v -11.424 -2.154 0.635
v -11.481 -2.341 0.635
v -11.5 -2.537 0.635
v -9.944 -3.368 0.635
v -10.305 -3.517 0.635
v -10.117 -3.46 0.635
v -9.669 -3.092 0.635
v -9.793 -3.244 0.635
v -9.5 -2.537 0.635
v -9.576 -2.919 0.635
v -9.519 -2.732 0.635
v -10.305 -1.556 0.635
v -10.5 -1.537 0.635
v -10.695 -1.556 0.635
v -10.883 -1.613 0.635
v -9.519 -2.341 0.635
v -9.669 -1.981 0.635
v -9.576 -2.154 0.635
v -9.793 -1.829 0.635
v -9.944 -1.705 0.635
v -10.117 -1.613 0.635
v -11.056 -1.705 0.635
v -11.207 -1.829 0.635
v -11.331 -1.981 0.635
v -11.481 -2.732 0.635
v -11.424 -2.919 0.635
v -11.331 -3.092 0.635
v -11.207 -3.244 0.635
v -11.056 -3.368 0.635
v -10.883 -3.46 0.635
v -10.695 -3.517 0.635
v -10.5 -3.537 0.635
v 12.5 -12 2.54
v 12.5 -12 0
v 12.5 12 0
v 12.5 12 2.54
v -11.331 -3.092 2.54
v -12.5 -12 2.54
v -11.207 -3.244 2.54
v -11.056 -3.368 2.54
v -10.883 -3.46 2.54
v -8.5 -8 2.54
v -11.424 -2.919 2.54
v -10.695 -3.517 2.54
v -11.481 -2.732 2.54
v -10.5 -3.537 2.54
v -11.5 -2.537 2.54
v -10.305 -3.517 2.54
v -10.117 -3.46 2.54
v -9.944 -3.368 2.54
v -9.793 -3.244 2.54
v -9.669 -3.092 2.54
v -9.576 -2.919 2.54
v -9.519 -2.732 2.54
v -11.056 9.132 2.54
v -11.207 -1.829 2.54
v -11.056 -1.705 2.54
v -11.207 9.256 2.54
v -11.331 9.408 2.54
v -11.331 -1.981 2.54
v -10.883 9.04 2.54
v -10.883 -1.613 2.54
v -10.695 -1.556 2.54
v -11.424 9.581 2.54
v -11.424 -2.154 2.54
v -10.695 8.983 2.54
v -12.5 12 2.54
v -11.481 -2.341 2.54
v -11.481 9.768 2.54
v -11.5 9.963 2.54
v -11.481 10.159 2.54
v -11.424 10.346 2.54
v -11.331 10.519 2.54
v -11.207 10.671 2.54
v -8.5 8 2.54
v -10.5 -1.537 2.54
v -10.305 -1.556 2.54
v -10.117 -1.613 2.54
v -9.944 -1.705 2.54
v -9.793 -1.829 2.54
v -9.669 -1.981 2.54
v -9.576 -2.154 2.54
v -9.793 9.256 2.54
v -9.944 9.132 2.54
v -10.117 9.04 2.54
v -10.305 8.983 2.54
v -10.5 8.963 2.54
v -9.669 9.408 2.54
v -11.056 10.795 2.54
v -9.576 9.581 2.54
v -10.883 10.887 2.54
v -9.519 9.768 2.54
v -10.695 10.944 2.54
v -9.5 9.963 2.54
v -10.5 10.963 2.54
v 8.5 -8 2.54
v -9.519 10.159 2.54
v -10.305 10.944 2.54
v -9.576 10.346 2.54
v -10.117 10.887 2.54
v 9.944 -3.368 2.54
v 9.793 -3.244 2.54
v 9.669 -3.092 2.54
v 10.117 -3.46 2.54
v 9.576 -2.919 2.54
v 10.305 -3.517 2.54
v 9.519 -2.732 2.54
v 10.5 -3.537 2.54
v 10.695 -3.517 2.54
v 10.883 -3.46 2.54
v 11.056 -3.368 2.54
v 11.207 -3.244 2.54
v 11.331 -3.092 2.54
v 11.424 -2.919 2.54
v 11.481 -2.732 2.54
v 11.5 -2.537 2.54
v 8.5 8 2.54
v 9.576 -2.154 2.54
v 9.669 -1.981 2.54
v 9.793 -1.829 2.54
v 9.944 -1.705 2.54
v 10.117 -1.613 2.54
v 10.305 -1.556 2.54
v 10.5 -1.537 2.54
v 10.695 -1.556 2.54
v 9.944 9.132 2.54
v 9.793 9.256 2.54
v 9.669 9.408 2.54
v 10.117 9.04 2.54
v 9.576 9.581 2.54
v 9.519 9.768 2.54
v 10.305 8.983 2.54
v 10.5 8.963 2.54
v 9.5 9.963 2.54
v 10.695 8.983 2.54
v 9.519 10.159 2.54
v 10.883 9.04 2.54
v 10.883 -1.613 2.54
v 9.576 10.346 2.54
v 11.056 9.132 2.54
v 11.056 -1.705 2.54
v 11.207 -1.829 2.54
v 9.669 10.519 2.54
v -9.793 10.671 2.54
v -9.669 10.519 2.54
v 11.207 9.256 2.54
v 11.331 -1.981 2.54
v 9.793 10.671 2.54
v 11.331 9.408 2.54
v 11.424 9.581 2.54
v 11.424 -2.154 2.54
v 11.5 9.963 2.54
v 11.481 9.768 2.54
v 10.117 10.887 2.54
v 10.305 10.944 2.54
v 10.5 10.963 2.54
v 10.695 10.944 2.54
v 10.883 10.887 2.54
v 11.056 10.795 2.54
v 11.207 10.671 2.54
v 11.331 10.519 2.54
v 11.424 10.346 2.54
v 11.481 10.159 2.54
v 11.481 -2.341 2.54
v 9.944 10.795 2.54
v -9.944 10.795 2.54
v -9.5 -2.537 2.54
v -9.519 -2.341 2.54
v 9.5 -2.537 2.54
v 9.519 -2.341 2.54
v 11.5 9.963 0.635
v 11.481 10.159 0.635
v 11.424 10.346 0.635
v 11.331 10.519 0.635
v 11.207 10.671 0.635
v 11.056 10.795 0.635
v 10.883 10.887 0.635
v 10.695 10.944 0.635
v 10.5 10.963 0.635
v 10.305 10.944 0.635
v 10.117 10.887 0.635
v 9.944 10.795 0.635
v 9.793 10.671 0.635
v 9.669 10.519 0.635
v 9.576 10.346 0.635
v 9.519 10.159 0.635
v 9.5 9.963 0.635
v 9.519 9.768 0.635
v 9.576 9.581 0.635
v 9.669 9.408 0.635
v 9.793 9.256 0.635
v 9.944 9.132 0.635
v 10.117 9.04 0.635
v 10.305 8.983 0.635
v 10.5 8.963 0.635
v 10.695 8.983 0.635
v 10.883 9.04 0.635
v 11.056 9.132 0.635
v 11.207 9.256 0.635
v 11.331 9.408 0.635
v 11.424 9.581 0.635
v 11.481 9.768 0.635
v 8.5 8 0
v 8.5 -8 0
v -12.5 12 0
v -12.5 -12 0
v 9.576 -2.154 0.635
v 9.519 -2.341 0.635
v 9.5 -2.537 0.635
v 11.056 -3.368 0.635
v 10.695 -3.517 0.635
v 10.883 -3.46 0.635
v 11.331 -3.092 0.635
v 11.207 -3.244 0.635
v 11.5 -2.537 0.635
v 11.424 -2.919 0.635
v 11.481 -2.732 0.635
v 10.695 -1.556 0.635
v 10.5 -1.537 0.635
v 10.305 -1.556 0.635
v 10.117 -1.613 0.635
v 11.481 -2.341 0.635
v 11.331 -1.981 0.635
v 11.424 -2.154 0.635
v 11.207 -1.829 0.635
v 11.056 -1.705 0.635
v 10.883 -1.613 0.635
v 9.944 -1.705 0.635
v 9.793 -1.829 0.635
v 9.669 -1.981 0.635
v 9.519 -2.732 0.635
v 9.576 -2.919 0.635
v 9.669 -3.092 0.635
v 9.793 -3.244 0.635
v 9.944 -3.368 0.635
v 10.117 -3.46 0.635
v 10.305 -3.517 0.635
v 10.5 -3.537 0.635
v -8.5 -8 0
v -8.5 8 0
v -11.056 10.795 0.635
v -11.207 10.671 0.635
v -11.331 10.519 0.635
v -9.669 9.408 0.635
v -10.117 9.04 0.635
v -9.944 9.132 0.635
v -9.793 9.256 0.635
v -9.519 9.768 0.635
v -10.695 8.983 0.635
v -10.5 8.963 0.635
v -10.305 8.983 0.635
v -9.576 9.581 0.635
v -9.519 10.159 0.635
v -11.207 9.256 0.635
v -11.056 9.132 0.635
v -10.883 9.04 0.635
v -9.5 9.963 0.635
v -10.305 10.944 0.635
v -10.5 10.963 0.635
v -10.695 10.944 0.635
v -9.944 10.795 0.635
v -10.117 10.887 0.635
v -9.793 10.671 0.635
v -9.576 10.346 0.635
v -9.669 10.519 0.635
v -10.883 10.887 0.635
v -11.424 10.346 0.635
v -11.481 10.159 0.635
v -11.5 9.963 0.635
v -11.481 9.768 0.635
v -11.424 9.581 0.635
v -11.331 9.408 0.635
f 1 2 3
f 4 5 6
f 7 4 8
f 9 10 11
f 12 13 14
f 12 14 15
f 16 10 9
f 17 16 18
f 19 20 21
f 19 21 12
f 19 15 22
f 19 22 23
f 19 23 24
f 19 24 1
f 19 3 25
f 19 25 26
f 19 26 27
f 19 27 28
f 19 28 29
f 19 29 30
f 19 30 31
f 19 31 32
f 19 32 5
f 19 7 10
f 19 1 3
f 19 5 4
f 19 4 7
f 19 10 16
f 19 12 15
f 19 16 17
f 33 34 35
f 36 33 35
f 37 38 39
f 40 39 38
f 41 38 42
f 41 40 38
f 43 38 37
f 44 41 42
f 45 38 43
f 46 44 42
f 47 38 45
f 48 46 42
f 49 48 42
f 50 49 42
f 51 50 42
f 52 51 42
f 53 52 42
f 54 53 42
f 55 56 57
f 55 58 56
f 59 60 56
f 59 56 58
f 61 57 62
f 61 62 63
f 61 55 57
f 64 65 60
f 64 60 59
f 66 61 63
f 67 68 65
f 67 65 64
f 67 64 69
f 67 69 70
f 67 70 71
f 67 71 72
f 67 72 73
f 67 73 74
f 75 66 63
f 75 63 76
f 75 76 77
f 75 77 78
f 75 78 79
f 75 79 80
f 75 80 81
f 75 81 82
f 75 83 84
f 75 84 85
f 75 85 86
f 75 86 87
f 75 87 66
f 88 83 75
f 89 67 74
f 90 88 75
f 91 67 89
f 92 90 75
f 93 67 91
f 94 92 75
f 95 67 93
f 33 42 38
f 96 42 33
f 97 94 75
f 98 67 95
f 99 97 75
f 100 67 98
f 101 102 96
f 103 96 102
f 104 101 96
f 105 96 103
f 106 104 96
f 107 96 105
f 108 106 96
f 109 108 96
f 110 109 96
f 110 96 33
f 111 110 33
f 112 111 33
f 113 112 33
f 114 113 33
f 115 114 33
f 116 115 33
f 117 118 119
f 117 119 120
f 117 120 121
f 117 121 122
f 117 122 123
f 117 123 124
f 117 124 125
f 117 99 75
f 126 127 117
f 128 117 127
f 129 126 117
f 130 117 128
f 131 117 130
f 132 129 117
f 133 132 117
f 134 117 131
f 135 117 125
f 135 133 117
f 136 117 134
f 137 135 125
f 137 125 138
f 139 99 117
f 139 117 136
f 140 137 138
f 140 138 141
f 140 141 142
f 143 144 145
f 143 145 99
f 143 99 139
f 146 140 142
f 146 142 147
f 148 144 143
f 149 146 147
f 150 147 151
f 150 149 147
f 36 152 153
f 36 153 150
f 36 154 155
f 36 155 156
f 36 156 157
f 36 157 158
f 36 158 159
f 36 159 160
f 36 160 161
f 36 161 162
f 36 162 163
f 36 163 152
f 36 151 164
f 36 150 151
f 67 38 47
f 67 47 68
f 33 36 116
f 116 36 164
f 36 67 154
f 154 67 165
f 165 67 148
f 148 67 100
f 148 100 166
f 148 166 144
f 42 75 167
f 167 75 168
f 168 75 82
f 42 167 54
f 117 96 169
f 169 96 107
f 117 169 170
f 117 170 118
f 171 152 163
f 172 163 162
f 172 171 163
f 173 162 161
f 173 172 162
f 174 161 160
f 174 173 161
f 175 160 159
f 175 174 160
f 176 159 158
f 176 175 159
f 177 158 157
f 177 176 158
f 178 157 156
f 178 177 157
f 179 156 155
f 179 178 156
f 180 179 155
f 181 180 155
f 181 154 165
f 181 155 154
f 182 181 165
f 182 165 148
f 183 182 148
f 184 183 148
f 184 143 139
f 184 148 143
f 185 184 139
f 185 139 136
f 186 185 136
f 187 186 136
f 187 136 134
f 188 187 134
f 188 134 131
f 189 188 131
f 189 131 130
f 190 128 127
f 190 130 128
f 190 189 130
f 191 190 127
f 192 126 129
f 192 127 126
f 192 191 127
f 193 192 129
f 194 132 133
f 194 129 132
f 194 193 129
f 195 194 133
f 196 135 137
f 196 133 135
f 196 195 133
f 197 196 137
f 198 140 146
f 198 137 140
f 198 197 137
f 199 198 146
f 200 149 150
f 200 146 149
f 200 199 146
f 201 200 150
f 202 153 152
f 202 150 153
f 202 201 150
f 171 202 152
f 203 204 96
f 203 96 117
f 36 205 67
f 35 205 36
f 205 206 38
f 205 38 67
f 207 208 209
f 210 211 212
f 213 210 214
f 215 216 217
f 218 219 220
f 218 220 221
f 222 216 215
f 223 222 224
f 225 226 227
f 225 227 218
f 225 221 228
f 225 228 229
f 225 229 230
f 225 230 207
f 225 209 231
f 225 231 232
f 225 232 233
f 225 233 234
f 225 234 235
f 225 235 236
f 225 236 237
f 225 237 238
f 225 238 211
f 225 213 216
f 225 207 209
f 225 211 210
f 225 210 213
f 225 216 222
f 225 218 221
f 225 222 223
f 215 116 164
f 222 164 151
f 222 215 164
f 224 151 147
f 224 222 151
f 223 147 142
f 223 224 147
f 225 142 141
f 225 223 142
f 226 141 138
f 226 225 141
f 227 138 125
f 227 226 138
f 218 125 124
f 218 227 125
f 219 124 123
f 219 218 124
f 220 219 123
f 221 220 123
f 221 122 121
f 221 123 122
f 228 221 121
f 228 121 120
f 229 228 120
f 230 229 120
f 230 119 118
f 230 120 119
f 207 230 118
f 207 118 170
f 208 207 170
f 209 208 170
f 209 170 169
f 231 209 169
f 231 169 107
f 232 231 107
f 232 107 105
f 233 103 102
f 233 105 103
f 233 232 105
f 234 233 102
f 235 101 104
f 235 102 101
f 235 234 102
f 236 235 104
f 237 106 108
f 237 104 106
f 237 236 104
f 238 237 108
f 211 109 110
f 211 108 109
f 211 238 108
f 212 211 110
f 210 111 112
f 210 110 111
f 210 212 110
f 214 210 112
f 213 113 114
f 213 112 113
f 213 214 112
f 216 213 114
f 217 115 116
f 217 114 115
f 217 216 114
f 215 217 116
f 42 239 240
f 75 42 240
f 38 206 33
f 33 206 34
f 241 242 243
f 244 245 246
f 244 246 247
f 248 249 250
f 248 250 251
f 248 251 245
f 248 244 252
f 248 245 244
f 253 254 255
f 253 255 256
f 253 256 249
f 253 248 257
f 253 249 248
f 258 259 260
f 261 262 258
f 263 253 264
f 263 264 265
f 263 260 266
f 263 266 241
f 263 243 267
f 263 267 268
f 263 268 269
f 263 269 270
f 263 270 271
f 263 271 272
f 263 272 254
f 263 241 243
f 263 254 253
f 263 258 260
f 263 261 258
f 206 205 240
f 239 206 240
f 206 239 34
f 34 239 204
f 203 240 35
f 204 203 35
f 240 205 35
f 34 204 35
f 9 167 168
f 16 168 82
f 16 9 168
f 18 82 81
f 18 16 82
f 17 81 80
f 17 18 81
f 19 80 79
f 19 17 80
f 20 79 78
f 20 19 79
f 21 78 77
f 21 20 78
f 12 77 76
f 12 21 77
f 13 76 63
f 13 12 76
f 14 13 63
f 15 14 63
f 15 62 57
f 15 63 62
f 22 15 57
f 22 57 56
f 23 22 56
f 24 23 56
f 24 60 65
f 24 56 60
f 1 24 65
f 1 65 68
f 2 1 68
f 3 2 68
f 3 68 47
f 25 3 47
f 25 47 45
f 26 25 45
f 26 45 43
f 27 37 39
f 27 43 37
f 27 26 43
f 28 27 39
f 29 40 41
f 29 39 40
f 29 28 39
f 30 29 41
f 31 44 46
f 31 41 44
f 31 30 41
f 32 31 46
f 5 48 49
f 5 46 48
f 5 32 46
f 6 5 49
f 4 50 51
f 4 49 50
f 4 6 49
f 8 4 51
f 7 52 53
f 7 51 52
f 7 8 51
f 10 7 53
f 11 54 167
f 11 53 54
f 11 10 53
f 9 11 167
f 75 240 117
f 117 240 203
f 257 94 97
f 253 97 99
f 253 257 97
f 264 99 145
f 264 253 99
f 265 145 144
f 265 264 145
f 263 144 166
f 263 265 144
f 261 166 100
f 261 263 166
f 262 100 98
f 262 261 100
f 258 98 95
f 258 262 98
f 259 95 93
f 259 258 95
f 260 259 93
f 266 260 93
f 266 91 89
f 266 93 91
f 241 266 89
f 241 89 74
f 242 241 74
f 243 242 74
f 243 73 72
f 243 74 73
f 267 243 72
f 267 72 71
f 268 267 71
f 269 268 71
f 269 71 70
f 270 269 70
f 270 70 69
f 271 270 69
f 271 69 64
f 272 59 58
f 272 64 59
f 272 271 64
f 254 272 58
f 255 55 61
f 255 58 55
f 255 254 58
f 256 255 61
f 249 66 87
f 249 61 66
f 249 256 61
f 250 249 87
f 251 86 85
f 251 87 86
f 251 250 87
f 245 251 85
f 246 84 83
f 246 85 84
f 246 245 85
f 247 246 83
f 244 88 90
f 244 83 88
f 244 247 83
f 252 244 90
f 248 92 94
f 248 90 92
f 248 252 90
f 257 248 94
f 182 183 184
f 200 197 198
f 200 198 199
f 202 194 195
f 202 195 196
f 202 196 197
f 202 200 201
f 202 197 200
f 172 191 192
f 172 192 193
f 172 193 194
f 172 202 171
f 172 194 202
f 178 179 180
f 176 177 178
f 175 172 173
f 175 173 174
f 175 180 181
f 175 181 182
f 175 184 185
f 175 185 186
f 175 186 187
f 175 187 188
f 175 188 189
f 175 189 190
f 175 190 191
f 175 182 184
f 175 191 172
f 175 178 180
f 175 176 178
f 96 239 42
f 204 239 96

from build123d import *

# Parameters (mm, degrees)
SKETCH1_W           = 25.0000008
SKETCH1_H           = 24.00000026
SKETCH1_W_2         = 17.000000544
SKETCH1_H_2         = 16.000000004
BOSS_EXTRUDE1_DEPTH = 2.54
SKETCH2_R           = 1.000000032
CUT_EXTRUDE1_DEPTH  = 2.54


with BuildPart() as part:
    # Sketch1 → Boss-Extrude1 (new body)
    with BuildSketch(Plane.XY):
        Rectangle(SKETCH1_W, SKETCH1_H)
        Rectangle(SKETCH1_W_2, SKETCH1_H_2, mode=Mode.SUBTRACT)
    extrude(amount=BOSS_EXTRUDE1_DEPTH)

    # Sketch2 → Cut-Extrude1 (cut)
    with BuildSketch(Plane.XY.offset(0.635)):
        with Locations((-10.500000336, 9.963437842)):
            Circle(SKETCH2_R)
        with Locations((-10.500000336, -2.536562558)):
            Circle(SKETCH2_R)
        with Locations((10.500000336, 9.963437842)):
            Circle(SKETCH2_R)
        with Locations((10.500000336, -2.536562558)):
            Circle(SKETCH2_R)
    extrude(amount=CUT_EXTRUDE1_DEPTH, mode=Mode.SUBTRACT)


solid = part.part
